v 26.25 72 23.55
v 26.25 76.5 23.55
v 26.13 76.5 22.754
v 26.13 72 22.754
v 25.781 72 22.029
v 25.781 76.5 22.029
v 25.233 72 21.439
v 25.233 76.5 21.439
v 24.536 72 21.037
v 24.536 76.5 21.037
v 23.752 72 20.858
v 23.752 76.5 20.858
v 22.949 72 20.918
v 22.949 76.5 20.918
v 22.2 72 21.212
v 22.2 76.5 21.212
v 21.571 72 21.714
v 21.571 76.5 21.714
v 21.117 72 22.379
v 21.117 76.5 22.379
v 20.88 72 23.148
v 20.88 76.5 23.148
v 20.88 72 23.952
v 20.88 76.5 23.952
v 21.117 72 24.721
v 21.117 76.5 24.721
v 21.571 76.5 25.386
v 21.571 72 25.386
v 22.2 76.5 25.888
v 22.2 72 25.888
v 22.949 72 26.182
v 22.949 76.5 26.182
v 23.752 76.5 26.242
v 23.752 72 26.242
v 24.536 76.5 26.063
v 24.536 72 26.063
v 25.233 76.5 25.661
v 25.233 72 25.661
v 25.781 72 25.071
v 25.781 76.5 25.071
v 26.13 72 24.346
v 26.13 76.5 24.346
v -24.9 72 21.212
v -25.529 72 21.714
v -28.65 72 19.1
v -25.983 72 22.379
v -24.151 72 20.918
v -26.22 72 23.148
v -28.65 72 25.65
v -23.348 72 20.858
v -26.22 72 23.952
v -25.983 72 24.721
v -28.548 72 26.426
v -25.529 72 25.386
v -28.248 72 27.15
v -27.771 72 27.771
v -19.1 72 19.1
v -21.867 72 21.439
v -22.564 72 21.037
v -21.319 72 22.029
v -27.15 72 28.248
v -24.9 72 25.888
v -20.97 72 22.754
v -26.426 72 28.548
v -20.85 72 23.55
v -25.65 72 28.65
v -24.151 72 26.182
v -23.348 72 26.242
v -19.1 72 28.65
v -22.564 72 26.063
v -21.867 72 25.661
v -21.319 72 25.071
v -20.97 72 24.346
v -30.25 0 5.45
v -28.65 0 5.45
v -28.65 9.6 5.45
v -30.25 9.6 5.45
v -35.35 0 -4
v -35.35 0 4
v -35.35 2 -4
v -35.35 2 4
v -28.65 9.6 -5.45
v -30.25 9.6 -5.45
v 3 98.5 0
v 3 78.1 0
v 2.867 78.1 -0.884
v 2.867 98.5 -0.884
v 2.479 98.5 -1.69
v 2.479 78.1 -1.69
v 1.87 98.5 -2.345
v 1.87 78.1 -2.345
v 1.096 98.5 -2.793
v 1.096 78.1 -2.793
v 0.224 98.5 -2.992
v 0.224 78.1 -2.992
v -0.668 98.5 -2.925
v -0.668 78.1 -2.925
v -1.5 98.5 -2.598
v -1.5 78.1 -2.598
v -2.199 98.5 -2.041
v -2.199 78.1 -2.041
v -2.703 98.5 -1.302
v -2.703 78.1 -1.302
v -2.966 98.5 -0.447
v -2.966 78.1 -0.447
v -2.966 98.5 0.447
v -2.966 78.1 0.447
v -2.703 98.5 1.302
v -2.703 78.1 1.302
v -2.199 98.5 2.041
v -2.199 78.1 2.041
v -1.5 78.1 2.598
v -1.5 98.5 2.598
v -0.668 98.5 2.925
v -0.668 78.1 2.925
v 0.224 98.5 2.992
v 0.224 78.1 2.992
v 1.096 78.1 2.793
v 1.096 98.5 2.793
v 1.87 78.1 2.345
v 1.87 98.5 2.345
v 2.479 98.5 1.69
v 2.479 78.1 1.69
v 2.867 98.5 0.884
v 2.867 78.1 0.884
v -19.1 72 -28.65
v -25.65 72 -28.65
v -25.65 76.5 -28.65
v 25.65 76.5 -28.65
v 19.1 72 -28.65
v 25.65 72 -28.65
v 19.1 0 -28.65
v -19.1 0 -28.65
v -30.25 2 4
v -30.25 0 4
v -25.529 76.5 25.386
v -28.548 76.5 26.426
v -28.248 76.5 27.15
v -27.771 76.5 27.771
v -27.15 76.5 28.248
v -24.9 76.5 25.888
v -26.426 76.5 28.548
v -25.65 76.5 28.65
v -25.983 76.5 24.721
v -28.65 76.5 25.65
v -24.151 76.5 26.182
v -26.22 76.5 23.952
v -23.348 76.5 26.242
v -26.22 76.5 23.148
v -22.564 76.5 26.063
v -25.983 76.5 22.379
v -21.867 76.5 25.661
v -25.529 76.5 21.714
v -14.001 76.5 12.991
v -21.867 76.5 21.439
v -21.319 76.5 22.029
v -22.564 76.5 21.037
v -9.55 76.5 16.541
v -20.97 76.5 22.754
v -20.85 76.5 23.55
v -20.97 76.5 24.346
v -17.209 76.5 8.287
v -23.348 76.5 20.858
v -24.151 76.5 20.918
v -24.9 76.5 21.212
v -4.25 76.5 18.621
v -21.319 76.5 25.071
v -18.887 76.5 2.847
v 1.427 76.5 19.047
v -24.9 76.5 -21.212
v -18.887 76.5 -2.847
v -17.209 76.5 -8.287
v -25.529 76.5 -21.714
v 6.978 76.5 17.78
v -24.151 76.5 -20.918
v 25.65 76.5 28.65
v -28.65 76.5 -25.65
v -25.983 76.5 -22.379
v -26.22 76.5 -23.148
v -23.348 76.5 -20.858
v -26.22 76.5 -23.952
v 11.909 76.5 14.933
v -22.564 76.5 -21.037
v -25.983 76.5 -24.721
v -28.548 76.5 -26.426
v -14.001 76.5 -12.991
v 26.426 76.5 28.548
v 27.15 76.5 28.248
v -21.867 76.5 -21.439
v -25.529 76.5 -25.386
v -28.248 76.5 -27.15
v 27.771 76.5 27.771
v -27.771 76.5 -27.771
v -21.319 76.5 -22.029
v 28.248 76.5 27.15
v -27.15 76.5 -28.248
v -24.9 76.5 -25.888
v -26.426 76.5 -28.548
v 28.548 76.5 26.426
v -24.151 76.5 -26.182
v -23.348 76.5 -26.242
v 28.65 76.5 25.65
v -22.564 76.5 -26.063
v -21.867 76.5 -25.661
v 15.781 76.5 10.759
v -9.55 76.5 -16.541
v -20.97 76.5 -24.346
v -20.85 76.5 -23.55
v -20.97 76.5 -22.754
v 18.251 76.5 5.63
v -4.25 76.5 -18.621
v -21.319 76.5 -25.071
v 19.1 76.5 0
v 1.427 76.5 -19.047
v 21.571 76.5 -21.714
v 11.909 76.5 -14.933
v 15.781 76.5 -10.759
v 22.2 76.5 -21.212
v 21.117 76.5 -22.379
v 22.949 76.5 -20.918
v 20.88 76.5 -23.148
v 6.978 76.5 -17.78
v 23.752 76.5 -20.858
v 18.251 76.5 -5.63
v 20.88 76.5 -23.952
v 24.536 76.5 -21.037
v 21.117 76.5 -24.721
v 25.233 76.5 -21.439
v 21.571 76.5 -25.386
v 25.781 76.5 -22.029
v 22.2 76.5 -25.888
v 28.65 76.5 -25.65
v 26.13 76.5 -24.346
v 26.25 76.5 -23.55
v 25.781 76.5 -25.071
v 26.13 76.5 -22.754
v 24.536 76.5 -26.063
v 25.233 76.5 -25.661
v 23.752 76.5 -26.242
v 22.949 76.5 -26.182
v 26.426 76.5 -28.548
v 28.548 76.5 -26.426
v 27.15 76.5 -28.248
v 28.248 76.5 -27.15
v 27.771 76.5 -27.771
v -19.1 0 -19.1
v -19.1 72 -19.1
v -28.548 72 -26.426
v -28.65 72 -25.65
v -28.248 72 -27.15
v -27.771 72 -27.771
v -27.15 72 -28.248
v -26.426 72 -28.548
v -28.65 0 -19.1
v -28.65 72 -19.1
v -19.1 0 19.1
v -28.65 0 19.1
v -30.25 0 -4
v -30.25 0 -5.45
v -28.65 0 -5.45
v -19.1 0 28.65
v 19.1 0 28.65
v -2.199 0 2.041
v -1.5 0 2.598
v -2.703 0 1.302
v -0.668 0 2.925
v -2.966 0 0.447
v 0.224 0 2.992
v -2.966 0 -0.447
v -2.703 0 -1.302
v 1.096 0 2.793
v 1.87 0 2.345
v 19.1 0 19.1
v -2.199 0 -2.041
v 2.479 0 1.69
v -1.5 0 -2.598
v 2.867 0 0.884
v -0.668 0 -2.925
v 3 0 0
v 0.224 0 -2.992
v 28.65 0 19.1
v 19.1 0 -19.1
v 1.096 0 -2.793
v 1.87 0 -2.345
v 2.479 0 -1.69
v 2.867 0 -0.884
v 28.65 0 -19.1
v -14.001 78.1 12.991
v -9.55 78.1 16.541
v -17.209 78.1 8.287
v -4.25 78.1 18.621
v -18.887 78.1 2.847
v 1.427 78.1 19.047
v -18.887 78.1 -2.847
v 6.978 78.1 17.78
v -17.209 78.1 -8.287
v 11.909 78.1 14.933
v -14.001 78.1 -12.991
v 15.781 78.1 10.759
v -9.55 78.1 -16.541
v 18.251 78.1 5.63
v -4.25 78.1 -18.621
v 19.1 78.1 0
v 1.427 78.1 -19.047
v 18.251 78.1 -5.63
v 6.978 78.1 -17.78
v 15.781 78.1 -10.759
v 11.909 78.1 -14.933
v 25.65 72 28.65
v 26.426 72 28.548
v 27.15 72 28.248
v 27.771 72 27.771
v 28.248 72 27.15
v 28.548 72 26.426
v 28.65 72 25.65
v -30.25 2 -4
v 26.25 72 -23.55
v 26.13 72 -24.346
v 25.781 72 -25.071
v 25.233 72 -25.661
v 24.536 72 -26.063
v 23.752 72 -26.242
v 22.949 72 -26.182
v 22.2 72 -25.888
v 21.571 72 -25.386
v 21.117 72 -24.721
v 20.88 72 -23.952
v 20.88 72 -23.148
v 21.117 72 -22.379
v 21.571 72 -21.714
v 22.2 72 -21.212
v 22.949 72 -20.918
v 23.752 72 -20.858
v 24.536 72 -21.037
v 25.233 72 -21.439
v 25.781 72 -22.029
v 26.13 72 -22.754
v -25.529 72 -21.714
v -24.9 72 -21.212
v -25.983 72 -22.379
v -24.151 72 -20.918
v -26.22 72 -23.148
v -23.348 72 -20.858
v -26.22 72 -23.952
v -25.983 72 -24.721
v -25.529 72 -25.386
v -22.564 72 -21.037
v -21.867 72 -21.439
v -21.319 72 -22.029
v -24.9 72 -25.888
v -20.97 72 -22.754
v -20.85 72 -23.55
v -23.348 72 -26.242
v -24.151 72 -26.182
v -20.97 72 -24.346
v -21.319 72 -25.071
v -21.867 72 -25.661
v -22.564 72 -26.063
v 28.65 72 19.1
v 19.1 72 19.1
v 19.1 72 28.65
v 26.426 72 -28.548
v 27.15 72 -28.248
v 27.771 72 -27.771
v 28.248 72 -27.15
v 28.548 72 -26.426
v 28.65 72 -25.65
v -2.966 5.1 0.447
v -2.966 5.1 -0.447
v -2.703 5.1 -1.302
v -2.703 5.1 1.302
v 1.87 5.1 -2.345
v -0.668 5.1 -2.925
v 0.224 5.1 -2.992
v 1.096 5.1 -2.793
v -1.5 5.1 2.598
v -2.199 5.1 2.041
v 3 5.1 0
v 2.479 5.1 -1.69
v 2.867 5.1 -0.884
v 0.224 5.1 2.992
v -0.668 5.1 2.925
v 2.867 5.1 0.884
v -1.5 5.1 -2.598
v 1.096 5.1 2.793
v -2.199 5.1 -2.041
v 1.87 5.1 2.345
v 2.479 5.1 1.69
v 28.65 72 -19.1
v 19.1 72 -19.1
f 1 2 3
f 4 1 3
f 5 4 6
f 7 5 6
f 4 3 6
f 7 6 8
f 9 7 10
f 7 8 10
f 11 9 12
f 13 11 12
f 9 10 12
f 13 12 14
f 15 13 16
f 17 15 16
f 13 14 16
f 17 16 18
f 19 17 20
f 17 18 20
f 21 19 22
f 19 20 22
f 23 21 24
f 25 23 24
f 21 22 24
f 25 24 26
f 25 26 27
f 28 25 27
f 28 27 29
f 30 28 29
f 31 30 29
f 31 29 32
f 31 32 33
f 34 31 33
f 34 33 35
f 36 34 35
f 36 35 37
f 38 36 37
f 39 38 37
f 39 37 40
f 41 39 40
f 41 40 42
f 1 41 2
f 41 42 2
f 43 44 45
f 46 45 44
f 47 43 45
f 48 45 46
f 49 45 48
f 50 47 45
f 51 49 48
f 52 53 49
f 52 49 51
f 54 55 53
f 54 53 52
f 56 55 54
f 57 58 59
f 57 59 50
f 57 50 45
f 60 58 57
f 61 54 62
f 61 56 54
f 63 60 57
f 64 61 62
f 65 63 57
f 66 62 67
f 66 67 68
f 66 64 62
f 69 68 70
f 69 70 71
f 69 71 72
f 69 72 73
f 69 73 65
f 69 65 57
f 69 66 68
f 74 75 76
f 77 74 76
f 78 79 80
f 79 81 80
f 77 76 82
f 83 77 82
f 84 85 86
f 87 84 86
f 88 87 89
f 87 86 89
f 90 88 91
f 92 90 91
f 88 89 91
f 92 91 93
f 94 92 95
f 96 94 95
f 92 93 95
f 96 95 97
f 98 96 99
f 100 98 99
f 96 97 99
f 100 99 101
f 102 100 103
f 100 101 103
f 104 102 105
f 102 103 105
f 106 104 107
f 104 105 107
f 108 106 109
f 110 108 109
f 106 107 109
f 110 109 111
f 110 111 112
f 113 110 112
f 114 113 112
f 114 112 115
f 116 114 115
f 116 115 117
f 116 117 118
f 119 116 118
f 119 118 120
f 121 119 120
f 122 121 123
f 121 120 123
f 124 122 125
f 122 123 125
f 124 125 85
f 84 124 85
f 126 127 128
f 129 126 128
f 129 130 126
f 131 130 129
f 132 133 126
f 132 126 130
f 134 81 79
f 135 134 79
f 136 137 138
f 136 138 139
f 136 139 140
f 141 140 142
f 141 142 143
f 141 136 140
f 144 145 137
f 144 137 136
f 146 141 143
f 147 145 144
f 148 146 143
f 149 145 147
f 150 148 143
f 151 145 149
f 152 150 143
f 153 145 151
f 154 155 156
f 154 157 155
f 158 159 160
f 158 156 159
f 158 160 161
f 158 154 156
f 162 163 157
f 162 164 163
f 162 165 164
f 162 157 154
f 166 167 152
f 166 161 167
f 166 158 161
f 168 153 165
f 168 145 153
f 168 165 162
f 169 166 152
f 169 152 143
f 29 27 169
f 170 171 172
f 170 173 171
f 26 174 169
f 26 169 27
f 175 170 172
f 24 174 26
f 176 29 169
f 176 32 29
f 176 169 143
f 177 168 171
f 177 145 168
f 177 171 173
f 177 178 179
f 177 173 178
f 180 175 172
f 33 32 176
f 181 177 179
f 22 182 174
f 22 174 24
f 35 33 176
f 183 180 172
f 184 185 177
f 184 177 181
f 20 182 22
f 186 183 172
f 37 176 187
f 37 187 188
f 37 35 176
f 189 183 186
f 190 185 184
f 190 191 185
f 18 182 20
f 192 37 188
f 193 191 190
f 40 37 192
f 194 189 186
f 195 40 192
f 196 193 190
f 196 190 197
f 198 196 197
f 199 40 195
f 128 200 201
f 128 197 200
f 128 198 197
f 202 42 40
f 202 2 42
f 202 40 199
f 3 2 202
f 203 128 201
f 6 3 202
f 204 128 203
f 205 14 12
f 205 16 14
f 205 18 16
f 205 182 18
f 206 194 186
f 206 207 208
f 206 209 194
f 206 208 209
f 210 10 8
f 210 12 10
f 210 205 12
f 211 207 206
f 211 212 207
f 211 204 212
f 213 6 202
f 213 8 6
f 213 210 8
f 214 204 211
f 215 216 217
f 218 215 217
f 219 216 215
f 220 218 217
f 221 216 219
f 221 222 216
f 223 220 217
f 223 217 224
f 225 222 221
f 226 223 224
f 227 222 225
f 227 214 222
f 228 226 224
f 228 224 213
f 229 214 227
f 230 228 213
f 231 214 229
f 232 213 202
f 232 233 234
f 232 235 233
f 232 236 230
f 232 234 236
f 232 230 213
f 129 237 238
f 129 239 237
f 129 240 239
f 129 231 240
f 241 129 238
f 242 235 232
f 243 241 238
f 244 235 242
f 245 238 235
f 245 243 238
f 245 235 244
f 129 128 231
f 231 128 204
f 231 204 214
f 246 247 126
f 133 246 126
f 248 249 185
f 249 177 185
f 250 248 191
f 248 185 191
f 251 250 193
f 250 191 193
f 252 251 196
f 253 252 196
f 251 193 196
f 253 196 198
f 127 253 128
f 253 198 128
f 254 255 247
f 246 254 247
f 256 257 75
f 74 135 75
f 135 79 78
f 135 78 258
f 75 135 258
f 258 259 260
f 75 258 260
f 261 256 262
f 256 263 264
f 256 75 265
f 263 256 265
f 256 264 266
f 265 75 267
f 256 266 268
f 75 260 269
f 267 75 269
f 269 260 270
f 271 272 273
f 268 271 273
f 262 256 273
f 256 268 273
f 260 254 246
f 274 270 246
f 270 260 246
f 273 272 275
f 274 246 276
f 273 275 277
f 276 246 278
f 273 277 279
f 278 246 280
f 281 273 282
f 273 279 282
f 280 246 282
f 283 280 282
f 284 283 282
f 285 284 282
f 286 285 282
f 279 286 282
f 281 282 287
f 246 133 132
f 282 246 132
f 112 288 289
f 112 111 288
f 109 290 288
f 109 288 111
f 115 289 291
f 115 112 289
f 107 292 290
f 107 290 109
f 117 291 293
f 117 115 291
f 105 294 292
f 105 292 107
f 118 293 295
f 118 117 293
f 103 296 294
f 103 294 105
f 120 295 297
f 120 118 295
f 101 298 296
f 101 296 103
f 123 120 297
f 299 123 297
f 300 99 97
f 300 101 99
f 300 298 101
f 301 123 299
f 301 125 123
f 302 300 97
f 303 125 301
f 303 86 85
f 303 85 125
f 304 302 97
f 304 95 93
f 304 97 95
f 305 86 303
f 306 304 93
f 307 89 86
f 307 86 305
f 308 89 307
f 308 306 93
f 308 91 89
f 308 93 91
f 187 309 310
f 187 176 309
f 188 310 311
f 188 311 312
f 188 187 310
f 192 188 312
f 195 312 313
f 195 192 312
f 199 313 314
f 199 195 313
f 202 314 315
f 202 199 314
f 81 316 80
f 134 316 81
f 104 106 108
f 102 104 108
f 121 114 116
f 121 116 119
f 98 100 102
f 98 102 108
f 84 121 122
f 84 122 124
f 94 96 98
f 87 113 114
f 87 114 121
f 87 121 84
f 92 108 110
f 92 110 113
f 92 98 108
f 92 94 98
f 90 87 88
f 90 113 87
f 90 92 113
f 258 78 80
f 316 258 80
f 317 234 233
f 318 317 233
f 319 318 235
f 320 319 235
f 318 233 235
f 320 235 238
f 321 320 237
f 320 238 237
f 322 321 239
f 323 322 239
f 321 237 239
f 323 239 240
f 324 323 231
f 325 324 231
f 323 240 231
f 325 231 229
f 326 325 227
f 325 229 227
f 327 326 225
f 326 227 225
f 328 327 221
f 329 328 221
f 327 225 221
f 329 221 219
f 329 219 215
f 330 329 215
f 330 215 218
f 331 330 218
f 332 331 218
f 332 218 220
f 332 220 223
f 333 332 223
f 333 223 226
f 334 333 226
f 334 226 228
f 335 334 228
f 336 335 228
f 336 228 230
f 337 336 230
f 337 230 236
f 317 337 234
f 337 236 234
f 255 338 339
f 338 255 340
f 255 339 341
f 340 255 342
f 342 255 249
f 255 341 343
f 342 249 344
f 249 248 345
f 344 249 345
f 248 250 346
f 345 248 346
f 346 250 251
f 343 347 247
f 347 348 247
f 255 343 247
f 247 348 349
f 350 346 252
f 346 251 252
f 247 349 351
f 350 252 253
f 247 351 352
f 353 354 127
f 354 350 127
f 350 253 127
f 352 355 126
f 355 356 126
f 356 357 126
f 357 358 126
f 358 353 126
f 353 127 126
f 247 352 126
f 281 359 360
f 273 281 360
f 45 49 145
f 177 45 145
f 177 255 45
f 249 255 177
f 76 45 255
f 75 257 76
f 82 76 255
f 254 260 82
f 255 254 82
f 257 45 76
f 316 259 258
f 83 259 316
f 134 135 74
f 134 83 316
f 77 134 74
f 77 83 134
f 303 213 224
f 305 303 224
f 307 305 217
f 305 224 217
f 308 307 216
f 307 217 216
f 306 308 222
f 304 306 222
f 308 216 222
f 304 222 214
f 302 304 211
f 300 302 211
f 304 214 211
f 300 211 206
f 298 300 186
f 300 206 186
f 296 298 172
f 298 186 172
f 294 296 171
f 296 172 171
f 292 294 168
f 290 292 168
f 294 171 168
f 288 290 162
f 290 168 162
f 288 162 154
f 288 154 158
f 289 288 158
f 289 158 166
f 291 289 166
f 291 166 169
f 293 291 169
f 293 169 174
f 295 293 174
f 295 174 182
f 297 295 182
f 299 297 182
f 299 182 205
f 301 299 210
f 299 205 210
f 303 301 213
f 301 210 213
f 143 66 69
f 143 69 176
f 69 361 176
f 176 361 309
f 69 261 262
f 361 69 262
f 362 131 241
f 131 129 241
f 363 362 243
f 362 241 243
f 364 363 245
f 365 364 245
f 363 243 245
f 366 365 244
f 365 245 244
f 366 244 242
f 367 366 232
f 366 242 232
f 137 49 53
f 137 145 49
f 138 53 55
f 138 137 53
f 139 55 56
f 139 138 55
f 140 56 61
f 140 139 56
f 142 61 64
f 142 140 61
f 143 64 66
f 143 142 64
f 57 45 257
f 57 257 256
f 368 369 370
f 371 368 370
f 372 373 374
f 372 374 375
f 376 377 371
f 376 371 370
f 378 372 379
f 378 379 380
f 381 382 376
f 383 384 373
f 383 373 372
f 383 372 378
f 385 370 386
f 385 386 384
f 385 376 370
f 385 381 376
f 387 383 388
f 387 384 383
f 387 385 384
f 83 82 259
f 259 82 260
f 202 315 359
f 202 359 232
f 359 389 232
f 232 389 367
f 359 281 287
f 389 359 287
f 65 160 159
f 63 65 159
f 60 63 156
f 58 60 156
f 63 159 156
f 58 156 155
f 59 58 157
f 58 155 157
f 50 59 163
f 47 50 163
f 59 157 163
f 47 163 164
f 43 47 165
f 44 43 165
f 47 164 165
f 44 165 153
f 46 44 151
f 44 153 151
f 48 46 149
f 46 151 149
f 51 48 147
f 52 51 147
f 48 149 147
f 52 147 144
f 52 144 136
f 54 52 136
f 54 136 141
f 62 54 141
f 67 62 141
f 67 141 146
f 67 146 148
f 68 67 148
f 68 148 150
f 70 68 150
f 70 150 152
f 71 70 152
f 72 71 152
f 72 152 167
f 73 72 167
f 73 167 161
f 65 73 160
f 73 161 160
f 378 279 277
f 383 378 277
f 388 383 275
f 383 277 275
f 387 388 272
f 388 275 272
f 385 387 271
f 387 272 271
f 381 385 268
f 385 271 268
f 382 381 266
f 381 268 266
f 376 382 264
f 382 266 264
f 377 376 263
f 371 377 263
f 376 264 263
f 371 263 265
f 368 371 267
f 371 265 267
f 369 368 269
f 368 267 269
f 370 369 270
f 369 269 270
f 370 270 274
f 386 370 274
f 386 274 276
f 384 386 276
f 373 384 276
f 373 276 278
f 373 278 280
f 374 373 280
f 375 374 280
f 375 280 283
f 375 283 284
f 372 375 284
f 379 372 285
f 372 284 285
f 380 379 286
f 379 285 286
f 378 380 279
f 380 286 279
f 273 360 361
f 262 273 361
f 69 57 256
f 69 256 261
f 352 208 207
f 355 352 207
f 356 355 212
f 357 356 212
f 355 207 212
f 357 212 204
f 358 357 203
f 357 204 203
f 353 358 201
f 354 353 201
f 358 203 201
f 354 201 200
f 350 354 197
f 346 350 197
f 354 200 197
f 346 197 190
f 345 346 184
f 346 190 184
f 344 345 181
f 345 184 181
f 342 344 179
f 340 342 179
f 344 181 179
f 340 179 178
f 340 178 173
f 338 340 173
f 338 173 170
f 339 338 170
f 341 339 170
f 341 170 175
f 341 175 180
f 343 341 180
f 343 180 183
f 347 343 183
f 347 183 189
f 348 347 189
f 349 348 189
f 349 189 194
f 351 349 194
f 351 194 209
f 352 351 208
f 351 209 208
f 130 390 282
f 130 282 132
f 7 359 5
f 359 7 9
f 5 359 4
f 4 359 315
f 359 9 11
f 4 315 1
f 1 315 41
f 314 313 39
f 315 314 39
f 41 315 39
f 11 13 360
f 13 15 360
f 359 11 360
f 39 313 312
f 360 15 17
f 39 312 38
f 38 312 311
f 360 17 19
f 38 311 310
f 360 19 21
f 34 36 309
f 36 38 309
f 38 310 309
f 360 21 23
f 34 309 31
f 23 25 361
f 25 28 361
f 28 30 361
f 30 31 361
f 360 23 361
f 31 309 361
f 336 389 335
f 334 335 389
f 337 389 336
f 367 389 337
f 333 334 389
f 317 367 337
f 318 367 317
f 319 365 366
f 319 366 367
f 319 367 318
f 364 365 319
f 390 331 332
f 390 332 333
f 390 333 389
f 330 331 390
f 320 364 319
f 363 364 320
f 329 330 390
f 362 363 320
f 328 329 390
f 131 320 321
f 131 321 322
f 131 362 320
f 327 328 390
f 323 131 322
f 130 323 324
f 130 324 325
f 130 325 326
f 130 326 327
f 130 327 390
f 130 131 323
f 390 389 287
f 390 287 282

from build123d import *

# Parameters (mm, degrees)
SKETCH1_W               = 57.3
SKETCH1_H               = 57.3
BOSS_EXTRUDE1_DEPTH     = 76.5
SKETCH2_W               = 9.55
SKETCH2_H               = 9.55
CUT_EXTRUDE1_DEPTH      = 72
MIRROR2_COPY_1_SKETCH_W = 9.55
MIRROR2_COPY_1_SKETCH_H = 9.55
MIRROR2_COPY_1_DEPTH    = 72
SKETCH3_R               = 19.1
BOSS_EXTRUDE2_DEPTH     = 1.6
SKETCH4_R               = 3
BOSS_EXTRUDE3_DEPTH     = 20.4
SKETCH5_R               = 2.7
CUT_EXTRUDE2_DEPTH      = 4.5
FILLET2_R               = 3
BOSS_EXTRUDE4_DEPTH     = 1.6
BOSS_EXTRUDE5_DEPTH     = 5.1
SKETCH9_R               = 3
CUT_EXTRUDE3_DEPTH      = 5.1


with BuildPart() as part:
    # Sketch1 → Boss-Extrude1 (new body)
    with BuildSketch(Plane(origin=(0, 0, 0), x_dir=(1, 0, 0), z_dir=(0, 1, 0))):
        Rectangle(SKETCH1_W, SKETCH1_H)
    extrude(amount=BOSS_EXTRUDE1_DEPTH)

    # Sketch2 → Cut-Extrude1 (cut)
    with BuildSketch(Plane.XZ):
        with Locations((-23.875, 23.875)):
            Rectangle(SKETCH2_W, SKETCH2_H)
    cut_extrude1 = extrude(amount=-CUT_EXTRUDE1_DEPTH, mode=Mode.SUBTRACT)

    # Mirror1: Cut-Extrude1 across plane
    add(cut_extrude1.mirror(Plane(origin=(0, 0, 0), x_dir=(0, 0, 1), z_dir=(1, 0, 0))), mode=Mode.SUBTRACT)

    # Mirror2: Cut-Extrude1 across plane
    add(cut_extrude1.mirror(Plane.XY), mode=Mode.SUBTRACT)

    # Mirror2 copy 1 sketch → Mirror2 copy 1 (cut)
    with BuildSketch(Plane(origin=(0, 0, 0), x_dir=(-1, 0, 0), z_dir=(0, -1, 0))):
        with Locations((-23.875, 23.875)):
            Rectangle(MIRROR2_COPY_1_SKETCH_W, MIRROR2_COPY_1_SKETCH_H)
    extrude(amount=-MIRROR2_COPY_1_DEPTH, mode=Mode.SUBTRACT)

    # Sketch3 → Boss-Extrude2 (add)
    with BuildSketch(Plane(origin=(0, 76.5, 0), x_dir=(1, 0, 0), z_dir=(0, 1, 0))):
        Circle(SKETCH3_R)
    extrude(amount=BOSS_EXTRUDE2_DEPTH)

    # Sketch4 → Boss-Extrude3 (add)
    with BuildSketch(Plane(origin=(0, 78.1, 0), x_dir=(1, 0, 0), z_dir=(0, 1, 0))):
        Circle(SKETCH4_R)
    extrude(amount=BOSS_EXTRUDE3_DEPTH)

    # Sketch5 → Cut-Extrude2 (cut)
    with BuildSketch(Plane(origin=(0, 76.5, 0), x_dir=(1, 0, 0), z_dir=(0, 1, 0))):
        with Locations((-23.55, 23.55)):
            Circle(SKETCH5_R)
        with Locations((23.55, 23.55)):
            Circle(SKETCH5_R)
        with Locations((23.55, -23.55)):
            Circle(SKETCH5_R)
        with Locations((-23.55, -23.55)):
            Circle(SKETCH5_R)
    extrude(amount=-CUT_EXTRUDE2_DEPTH, mode=Mode.SUBTRACT)

    # Fillet2
    fillet2_edges = [part.edges().sort_by_distance(p)[0] for p in [
        (-28.65, 74.25, -28.65),
        (28.65, 74.25, -28.65),
        (28.65, 74.25, 28.65),
        (-28.65, 74.25, 28.65),
    ]]
    fillet(fillet2_edges, radius=FILLET2_R)

    # Sketch6 → Boss-Extrude4 (add)
    with BuildSketch(Plane.ZY.offset(28.65)):
        Polygon((0, 0), (5.45, 0), (5.45, 9.6), (-5.45, 9.6), (-5.45, 0), align=None)
    extrude(amount=BOSS_EXTRUDE4_DEPTH)

    # Sketch7 → Boss-Extrude5 (add)
    with BuildSketch(Plane.ZY.offset(30.25)):
        Polygon((0, 0), (-4, 0), (-4, 2), (4, 2), (4, 0), align=None)
    extrude(amount=BOSS_EXTRUDE5_DEPTH)

    # Sketch9 → Cut-Extrude3 (cut)
    with BuildSketch(Plane.XZ):
        Circle(SKETCH9_R)
    extrude(amount=-CUT_EXTRUDE3_DEPTH, mode=Mode.SUBTRACT)


solid = part.part
